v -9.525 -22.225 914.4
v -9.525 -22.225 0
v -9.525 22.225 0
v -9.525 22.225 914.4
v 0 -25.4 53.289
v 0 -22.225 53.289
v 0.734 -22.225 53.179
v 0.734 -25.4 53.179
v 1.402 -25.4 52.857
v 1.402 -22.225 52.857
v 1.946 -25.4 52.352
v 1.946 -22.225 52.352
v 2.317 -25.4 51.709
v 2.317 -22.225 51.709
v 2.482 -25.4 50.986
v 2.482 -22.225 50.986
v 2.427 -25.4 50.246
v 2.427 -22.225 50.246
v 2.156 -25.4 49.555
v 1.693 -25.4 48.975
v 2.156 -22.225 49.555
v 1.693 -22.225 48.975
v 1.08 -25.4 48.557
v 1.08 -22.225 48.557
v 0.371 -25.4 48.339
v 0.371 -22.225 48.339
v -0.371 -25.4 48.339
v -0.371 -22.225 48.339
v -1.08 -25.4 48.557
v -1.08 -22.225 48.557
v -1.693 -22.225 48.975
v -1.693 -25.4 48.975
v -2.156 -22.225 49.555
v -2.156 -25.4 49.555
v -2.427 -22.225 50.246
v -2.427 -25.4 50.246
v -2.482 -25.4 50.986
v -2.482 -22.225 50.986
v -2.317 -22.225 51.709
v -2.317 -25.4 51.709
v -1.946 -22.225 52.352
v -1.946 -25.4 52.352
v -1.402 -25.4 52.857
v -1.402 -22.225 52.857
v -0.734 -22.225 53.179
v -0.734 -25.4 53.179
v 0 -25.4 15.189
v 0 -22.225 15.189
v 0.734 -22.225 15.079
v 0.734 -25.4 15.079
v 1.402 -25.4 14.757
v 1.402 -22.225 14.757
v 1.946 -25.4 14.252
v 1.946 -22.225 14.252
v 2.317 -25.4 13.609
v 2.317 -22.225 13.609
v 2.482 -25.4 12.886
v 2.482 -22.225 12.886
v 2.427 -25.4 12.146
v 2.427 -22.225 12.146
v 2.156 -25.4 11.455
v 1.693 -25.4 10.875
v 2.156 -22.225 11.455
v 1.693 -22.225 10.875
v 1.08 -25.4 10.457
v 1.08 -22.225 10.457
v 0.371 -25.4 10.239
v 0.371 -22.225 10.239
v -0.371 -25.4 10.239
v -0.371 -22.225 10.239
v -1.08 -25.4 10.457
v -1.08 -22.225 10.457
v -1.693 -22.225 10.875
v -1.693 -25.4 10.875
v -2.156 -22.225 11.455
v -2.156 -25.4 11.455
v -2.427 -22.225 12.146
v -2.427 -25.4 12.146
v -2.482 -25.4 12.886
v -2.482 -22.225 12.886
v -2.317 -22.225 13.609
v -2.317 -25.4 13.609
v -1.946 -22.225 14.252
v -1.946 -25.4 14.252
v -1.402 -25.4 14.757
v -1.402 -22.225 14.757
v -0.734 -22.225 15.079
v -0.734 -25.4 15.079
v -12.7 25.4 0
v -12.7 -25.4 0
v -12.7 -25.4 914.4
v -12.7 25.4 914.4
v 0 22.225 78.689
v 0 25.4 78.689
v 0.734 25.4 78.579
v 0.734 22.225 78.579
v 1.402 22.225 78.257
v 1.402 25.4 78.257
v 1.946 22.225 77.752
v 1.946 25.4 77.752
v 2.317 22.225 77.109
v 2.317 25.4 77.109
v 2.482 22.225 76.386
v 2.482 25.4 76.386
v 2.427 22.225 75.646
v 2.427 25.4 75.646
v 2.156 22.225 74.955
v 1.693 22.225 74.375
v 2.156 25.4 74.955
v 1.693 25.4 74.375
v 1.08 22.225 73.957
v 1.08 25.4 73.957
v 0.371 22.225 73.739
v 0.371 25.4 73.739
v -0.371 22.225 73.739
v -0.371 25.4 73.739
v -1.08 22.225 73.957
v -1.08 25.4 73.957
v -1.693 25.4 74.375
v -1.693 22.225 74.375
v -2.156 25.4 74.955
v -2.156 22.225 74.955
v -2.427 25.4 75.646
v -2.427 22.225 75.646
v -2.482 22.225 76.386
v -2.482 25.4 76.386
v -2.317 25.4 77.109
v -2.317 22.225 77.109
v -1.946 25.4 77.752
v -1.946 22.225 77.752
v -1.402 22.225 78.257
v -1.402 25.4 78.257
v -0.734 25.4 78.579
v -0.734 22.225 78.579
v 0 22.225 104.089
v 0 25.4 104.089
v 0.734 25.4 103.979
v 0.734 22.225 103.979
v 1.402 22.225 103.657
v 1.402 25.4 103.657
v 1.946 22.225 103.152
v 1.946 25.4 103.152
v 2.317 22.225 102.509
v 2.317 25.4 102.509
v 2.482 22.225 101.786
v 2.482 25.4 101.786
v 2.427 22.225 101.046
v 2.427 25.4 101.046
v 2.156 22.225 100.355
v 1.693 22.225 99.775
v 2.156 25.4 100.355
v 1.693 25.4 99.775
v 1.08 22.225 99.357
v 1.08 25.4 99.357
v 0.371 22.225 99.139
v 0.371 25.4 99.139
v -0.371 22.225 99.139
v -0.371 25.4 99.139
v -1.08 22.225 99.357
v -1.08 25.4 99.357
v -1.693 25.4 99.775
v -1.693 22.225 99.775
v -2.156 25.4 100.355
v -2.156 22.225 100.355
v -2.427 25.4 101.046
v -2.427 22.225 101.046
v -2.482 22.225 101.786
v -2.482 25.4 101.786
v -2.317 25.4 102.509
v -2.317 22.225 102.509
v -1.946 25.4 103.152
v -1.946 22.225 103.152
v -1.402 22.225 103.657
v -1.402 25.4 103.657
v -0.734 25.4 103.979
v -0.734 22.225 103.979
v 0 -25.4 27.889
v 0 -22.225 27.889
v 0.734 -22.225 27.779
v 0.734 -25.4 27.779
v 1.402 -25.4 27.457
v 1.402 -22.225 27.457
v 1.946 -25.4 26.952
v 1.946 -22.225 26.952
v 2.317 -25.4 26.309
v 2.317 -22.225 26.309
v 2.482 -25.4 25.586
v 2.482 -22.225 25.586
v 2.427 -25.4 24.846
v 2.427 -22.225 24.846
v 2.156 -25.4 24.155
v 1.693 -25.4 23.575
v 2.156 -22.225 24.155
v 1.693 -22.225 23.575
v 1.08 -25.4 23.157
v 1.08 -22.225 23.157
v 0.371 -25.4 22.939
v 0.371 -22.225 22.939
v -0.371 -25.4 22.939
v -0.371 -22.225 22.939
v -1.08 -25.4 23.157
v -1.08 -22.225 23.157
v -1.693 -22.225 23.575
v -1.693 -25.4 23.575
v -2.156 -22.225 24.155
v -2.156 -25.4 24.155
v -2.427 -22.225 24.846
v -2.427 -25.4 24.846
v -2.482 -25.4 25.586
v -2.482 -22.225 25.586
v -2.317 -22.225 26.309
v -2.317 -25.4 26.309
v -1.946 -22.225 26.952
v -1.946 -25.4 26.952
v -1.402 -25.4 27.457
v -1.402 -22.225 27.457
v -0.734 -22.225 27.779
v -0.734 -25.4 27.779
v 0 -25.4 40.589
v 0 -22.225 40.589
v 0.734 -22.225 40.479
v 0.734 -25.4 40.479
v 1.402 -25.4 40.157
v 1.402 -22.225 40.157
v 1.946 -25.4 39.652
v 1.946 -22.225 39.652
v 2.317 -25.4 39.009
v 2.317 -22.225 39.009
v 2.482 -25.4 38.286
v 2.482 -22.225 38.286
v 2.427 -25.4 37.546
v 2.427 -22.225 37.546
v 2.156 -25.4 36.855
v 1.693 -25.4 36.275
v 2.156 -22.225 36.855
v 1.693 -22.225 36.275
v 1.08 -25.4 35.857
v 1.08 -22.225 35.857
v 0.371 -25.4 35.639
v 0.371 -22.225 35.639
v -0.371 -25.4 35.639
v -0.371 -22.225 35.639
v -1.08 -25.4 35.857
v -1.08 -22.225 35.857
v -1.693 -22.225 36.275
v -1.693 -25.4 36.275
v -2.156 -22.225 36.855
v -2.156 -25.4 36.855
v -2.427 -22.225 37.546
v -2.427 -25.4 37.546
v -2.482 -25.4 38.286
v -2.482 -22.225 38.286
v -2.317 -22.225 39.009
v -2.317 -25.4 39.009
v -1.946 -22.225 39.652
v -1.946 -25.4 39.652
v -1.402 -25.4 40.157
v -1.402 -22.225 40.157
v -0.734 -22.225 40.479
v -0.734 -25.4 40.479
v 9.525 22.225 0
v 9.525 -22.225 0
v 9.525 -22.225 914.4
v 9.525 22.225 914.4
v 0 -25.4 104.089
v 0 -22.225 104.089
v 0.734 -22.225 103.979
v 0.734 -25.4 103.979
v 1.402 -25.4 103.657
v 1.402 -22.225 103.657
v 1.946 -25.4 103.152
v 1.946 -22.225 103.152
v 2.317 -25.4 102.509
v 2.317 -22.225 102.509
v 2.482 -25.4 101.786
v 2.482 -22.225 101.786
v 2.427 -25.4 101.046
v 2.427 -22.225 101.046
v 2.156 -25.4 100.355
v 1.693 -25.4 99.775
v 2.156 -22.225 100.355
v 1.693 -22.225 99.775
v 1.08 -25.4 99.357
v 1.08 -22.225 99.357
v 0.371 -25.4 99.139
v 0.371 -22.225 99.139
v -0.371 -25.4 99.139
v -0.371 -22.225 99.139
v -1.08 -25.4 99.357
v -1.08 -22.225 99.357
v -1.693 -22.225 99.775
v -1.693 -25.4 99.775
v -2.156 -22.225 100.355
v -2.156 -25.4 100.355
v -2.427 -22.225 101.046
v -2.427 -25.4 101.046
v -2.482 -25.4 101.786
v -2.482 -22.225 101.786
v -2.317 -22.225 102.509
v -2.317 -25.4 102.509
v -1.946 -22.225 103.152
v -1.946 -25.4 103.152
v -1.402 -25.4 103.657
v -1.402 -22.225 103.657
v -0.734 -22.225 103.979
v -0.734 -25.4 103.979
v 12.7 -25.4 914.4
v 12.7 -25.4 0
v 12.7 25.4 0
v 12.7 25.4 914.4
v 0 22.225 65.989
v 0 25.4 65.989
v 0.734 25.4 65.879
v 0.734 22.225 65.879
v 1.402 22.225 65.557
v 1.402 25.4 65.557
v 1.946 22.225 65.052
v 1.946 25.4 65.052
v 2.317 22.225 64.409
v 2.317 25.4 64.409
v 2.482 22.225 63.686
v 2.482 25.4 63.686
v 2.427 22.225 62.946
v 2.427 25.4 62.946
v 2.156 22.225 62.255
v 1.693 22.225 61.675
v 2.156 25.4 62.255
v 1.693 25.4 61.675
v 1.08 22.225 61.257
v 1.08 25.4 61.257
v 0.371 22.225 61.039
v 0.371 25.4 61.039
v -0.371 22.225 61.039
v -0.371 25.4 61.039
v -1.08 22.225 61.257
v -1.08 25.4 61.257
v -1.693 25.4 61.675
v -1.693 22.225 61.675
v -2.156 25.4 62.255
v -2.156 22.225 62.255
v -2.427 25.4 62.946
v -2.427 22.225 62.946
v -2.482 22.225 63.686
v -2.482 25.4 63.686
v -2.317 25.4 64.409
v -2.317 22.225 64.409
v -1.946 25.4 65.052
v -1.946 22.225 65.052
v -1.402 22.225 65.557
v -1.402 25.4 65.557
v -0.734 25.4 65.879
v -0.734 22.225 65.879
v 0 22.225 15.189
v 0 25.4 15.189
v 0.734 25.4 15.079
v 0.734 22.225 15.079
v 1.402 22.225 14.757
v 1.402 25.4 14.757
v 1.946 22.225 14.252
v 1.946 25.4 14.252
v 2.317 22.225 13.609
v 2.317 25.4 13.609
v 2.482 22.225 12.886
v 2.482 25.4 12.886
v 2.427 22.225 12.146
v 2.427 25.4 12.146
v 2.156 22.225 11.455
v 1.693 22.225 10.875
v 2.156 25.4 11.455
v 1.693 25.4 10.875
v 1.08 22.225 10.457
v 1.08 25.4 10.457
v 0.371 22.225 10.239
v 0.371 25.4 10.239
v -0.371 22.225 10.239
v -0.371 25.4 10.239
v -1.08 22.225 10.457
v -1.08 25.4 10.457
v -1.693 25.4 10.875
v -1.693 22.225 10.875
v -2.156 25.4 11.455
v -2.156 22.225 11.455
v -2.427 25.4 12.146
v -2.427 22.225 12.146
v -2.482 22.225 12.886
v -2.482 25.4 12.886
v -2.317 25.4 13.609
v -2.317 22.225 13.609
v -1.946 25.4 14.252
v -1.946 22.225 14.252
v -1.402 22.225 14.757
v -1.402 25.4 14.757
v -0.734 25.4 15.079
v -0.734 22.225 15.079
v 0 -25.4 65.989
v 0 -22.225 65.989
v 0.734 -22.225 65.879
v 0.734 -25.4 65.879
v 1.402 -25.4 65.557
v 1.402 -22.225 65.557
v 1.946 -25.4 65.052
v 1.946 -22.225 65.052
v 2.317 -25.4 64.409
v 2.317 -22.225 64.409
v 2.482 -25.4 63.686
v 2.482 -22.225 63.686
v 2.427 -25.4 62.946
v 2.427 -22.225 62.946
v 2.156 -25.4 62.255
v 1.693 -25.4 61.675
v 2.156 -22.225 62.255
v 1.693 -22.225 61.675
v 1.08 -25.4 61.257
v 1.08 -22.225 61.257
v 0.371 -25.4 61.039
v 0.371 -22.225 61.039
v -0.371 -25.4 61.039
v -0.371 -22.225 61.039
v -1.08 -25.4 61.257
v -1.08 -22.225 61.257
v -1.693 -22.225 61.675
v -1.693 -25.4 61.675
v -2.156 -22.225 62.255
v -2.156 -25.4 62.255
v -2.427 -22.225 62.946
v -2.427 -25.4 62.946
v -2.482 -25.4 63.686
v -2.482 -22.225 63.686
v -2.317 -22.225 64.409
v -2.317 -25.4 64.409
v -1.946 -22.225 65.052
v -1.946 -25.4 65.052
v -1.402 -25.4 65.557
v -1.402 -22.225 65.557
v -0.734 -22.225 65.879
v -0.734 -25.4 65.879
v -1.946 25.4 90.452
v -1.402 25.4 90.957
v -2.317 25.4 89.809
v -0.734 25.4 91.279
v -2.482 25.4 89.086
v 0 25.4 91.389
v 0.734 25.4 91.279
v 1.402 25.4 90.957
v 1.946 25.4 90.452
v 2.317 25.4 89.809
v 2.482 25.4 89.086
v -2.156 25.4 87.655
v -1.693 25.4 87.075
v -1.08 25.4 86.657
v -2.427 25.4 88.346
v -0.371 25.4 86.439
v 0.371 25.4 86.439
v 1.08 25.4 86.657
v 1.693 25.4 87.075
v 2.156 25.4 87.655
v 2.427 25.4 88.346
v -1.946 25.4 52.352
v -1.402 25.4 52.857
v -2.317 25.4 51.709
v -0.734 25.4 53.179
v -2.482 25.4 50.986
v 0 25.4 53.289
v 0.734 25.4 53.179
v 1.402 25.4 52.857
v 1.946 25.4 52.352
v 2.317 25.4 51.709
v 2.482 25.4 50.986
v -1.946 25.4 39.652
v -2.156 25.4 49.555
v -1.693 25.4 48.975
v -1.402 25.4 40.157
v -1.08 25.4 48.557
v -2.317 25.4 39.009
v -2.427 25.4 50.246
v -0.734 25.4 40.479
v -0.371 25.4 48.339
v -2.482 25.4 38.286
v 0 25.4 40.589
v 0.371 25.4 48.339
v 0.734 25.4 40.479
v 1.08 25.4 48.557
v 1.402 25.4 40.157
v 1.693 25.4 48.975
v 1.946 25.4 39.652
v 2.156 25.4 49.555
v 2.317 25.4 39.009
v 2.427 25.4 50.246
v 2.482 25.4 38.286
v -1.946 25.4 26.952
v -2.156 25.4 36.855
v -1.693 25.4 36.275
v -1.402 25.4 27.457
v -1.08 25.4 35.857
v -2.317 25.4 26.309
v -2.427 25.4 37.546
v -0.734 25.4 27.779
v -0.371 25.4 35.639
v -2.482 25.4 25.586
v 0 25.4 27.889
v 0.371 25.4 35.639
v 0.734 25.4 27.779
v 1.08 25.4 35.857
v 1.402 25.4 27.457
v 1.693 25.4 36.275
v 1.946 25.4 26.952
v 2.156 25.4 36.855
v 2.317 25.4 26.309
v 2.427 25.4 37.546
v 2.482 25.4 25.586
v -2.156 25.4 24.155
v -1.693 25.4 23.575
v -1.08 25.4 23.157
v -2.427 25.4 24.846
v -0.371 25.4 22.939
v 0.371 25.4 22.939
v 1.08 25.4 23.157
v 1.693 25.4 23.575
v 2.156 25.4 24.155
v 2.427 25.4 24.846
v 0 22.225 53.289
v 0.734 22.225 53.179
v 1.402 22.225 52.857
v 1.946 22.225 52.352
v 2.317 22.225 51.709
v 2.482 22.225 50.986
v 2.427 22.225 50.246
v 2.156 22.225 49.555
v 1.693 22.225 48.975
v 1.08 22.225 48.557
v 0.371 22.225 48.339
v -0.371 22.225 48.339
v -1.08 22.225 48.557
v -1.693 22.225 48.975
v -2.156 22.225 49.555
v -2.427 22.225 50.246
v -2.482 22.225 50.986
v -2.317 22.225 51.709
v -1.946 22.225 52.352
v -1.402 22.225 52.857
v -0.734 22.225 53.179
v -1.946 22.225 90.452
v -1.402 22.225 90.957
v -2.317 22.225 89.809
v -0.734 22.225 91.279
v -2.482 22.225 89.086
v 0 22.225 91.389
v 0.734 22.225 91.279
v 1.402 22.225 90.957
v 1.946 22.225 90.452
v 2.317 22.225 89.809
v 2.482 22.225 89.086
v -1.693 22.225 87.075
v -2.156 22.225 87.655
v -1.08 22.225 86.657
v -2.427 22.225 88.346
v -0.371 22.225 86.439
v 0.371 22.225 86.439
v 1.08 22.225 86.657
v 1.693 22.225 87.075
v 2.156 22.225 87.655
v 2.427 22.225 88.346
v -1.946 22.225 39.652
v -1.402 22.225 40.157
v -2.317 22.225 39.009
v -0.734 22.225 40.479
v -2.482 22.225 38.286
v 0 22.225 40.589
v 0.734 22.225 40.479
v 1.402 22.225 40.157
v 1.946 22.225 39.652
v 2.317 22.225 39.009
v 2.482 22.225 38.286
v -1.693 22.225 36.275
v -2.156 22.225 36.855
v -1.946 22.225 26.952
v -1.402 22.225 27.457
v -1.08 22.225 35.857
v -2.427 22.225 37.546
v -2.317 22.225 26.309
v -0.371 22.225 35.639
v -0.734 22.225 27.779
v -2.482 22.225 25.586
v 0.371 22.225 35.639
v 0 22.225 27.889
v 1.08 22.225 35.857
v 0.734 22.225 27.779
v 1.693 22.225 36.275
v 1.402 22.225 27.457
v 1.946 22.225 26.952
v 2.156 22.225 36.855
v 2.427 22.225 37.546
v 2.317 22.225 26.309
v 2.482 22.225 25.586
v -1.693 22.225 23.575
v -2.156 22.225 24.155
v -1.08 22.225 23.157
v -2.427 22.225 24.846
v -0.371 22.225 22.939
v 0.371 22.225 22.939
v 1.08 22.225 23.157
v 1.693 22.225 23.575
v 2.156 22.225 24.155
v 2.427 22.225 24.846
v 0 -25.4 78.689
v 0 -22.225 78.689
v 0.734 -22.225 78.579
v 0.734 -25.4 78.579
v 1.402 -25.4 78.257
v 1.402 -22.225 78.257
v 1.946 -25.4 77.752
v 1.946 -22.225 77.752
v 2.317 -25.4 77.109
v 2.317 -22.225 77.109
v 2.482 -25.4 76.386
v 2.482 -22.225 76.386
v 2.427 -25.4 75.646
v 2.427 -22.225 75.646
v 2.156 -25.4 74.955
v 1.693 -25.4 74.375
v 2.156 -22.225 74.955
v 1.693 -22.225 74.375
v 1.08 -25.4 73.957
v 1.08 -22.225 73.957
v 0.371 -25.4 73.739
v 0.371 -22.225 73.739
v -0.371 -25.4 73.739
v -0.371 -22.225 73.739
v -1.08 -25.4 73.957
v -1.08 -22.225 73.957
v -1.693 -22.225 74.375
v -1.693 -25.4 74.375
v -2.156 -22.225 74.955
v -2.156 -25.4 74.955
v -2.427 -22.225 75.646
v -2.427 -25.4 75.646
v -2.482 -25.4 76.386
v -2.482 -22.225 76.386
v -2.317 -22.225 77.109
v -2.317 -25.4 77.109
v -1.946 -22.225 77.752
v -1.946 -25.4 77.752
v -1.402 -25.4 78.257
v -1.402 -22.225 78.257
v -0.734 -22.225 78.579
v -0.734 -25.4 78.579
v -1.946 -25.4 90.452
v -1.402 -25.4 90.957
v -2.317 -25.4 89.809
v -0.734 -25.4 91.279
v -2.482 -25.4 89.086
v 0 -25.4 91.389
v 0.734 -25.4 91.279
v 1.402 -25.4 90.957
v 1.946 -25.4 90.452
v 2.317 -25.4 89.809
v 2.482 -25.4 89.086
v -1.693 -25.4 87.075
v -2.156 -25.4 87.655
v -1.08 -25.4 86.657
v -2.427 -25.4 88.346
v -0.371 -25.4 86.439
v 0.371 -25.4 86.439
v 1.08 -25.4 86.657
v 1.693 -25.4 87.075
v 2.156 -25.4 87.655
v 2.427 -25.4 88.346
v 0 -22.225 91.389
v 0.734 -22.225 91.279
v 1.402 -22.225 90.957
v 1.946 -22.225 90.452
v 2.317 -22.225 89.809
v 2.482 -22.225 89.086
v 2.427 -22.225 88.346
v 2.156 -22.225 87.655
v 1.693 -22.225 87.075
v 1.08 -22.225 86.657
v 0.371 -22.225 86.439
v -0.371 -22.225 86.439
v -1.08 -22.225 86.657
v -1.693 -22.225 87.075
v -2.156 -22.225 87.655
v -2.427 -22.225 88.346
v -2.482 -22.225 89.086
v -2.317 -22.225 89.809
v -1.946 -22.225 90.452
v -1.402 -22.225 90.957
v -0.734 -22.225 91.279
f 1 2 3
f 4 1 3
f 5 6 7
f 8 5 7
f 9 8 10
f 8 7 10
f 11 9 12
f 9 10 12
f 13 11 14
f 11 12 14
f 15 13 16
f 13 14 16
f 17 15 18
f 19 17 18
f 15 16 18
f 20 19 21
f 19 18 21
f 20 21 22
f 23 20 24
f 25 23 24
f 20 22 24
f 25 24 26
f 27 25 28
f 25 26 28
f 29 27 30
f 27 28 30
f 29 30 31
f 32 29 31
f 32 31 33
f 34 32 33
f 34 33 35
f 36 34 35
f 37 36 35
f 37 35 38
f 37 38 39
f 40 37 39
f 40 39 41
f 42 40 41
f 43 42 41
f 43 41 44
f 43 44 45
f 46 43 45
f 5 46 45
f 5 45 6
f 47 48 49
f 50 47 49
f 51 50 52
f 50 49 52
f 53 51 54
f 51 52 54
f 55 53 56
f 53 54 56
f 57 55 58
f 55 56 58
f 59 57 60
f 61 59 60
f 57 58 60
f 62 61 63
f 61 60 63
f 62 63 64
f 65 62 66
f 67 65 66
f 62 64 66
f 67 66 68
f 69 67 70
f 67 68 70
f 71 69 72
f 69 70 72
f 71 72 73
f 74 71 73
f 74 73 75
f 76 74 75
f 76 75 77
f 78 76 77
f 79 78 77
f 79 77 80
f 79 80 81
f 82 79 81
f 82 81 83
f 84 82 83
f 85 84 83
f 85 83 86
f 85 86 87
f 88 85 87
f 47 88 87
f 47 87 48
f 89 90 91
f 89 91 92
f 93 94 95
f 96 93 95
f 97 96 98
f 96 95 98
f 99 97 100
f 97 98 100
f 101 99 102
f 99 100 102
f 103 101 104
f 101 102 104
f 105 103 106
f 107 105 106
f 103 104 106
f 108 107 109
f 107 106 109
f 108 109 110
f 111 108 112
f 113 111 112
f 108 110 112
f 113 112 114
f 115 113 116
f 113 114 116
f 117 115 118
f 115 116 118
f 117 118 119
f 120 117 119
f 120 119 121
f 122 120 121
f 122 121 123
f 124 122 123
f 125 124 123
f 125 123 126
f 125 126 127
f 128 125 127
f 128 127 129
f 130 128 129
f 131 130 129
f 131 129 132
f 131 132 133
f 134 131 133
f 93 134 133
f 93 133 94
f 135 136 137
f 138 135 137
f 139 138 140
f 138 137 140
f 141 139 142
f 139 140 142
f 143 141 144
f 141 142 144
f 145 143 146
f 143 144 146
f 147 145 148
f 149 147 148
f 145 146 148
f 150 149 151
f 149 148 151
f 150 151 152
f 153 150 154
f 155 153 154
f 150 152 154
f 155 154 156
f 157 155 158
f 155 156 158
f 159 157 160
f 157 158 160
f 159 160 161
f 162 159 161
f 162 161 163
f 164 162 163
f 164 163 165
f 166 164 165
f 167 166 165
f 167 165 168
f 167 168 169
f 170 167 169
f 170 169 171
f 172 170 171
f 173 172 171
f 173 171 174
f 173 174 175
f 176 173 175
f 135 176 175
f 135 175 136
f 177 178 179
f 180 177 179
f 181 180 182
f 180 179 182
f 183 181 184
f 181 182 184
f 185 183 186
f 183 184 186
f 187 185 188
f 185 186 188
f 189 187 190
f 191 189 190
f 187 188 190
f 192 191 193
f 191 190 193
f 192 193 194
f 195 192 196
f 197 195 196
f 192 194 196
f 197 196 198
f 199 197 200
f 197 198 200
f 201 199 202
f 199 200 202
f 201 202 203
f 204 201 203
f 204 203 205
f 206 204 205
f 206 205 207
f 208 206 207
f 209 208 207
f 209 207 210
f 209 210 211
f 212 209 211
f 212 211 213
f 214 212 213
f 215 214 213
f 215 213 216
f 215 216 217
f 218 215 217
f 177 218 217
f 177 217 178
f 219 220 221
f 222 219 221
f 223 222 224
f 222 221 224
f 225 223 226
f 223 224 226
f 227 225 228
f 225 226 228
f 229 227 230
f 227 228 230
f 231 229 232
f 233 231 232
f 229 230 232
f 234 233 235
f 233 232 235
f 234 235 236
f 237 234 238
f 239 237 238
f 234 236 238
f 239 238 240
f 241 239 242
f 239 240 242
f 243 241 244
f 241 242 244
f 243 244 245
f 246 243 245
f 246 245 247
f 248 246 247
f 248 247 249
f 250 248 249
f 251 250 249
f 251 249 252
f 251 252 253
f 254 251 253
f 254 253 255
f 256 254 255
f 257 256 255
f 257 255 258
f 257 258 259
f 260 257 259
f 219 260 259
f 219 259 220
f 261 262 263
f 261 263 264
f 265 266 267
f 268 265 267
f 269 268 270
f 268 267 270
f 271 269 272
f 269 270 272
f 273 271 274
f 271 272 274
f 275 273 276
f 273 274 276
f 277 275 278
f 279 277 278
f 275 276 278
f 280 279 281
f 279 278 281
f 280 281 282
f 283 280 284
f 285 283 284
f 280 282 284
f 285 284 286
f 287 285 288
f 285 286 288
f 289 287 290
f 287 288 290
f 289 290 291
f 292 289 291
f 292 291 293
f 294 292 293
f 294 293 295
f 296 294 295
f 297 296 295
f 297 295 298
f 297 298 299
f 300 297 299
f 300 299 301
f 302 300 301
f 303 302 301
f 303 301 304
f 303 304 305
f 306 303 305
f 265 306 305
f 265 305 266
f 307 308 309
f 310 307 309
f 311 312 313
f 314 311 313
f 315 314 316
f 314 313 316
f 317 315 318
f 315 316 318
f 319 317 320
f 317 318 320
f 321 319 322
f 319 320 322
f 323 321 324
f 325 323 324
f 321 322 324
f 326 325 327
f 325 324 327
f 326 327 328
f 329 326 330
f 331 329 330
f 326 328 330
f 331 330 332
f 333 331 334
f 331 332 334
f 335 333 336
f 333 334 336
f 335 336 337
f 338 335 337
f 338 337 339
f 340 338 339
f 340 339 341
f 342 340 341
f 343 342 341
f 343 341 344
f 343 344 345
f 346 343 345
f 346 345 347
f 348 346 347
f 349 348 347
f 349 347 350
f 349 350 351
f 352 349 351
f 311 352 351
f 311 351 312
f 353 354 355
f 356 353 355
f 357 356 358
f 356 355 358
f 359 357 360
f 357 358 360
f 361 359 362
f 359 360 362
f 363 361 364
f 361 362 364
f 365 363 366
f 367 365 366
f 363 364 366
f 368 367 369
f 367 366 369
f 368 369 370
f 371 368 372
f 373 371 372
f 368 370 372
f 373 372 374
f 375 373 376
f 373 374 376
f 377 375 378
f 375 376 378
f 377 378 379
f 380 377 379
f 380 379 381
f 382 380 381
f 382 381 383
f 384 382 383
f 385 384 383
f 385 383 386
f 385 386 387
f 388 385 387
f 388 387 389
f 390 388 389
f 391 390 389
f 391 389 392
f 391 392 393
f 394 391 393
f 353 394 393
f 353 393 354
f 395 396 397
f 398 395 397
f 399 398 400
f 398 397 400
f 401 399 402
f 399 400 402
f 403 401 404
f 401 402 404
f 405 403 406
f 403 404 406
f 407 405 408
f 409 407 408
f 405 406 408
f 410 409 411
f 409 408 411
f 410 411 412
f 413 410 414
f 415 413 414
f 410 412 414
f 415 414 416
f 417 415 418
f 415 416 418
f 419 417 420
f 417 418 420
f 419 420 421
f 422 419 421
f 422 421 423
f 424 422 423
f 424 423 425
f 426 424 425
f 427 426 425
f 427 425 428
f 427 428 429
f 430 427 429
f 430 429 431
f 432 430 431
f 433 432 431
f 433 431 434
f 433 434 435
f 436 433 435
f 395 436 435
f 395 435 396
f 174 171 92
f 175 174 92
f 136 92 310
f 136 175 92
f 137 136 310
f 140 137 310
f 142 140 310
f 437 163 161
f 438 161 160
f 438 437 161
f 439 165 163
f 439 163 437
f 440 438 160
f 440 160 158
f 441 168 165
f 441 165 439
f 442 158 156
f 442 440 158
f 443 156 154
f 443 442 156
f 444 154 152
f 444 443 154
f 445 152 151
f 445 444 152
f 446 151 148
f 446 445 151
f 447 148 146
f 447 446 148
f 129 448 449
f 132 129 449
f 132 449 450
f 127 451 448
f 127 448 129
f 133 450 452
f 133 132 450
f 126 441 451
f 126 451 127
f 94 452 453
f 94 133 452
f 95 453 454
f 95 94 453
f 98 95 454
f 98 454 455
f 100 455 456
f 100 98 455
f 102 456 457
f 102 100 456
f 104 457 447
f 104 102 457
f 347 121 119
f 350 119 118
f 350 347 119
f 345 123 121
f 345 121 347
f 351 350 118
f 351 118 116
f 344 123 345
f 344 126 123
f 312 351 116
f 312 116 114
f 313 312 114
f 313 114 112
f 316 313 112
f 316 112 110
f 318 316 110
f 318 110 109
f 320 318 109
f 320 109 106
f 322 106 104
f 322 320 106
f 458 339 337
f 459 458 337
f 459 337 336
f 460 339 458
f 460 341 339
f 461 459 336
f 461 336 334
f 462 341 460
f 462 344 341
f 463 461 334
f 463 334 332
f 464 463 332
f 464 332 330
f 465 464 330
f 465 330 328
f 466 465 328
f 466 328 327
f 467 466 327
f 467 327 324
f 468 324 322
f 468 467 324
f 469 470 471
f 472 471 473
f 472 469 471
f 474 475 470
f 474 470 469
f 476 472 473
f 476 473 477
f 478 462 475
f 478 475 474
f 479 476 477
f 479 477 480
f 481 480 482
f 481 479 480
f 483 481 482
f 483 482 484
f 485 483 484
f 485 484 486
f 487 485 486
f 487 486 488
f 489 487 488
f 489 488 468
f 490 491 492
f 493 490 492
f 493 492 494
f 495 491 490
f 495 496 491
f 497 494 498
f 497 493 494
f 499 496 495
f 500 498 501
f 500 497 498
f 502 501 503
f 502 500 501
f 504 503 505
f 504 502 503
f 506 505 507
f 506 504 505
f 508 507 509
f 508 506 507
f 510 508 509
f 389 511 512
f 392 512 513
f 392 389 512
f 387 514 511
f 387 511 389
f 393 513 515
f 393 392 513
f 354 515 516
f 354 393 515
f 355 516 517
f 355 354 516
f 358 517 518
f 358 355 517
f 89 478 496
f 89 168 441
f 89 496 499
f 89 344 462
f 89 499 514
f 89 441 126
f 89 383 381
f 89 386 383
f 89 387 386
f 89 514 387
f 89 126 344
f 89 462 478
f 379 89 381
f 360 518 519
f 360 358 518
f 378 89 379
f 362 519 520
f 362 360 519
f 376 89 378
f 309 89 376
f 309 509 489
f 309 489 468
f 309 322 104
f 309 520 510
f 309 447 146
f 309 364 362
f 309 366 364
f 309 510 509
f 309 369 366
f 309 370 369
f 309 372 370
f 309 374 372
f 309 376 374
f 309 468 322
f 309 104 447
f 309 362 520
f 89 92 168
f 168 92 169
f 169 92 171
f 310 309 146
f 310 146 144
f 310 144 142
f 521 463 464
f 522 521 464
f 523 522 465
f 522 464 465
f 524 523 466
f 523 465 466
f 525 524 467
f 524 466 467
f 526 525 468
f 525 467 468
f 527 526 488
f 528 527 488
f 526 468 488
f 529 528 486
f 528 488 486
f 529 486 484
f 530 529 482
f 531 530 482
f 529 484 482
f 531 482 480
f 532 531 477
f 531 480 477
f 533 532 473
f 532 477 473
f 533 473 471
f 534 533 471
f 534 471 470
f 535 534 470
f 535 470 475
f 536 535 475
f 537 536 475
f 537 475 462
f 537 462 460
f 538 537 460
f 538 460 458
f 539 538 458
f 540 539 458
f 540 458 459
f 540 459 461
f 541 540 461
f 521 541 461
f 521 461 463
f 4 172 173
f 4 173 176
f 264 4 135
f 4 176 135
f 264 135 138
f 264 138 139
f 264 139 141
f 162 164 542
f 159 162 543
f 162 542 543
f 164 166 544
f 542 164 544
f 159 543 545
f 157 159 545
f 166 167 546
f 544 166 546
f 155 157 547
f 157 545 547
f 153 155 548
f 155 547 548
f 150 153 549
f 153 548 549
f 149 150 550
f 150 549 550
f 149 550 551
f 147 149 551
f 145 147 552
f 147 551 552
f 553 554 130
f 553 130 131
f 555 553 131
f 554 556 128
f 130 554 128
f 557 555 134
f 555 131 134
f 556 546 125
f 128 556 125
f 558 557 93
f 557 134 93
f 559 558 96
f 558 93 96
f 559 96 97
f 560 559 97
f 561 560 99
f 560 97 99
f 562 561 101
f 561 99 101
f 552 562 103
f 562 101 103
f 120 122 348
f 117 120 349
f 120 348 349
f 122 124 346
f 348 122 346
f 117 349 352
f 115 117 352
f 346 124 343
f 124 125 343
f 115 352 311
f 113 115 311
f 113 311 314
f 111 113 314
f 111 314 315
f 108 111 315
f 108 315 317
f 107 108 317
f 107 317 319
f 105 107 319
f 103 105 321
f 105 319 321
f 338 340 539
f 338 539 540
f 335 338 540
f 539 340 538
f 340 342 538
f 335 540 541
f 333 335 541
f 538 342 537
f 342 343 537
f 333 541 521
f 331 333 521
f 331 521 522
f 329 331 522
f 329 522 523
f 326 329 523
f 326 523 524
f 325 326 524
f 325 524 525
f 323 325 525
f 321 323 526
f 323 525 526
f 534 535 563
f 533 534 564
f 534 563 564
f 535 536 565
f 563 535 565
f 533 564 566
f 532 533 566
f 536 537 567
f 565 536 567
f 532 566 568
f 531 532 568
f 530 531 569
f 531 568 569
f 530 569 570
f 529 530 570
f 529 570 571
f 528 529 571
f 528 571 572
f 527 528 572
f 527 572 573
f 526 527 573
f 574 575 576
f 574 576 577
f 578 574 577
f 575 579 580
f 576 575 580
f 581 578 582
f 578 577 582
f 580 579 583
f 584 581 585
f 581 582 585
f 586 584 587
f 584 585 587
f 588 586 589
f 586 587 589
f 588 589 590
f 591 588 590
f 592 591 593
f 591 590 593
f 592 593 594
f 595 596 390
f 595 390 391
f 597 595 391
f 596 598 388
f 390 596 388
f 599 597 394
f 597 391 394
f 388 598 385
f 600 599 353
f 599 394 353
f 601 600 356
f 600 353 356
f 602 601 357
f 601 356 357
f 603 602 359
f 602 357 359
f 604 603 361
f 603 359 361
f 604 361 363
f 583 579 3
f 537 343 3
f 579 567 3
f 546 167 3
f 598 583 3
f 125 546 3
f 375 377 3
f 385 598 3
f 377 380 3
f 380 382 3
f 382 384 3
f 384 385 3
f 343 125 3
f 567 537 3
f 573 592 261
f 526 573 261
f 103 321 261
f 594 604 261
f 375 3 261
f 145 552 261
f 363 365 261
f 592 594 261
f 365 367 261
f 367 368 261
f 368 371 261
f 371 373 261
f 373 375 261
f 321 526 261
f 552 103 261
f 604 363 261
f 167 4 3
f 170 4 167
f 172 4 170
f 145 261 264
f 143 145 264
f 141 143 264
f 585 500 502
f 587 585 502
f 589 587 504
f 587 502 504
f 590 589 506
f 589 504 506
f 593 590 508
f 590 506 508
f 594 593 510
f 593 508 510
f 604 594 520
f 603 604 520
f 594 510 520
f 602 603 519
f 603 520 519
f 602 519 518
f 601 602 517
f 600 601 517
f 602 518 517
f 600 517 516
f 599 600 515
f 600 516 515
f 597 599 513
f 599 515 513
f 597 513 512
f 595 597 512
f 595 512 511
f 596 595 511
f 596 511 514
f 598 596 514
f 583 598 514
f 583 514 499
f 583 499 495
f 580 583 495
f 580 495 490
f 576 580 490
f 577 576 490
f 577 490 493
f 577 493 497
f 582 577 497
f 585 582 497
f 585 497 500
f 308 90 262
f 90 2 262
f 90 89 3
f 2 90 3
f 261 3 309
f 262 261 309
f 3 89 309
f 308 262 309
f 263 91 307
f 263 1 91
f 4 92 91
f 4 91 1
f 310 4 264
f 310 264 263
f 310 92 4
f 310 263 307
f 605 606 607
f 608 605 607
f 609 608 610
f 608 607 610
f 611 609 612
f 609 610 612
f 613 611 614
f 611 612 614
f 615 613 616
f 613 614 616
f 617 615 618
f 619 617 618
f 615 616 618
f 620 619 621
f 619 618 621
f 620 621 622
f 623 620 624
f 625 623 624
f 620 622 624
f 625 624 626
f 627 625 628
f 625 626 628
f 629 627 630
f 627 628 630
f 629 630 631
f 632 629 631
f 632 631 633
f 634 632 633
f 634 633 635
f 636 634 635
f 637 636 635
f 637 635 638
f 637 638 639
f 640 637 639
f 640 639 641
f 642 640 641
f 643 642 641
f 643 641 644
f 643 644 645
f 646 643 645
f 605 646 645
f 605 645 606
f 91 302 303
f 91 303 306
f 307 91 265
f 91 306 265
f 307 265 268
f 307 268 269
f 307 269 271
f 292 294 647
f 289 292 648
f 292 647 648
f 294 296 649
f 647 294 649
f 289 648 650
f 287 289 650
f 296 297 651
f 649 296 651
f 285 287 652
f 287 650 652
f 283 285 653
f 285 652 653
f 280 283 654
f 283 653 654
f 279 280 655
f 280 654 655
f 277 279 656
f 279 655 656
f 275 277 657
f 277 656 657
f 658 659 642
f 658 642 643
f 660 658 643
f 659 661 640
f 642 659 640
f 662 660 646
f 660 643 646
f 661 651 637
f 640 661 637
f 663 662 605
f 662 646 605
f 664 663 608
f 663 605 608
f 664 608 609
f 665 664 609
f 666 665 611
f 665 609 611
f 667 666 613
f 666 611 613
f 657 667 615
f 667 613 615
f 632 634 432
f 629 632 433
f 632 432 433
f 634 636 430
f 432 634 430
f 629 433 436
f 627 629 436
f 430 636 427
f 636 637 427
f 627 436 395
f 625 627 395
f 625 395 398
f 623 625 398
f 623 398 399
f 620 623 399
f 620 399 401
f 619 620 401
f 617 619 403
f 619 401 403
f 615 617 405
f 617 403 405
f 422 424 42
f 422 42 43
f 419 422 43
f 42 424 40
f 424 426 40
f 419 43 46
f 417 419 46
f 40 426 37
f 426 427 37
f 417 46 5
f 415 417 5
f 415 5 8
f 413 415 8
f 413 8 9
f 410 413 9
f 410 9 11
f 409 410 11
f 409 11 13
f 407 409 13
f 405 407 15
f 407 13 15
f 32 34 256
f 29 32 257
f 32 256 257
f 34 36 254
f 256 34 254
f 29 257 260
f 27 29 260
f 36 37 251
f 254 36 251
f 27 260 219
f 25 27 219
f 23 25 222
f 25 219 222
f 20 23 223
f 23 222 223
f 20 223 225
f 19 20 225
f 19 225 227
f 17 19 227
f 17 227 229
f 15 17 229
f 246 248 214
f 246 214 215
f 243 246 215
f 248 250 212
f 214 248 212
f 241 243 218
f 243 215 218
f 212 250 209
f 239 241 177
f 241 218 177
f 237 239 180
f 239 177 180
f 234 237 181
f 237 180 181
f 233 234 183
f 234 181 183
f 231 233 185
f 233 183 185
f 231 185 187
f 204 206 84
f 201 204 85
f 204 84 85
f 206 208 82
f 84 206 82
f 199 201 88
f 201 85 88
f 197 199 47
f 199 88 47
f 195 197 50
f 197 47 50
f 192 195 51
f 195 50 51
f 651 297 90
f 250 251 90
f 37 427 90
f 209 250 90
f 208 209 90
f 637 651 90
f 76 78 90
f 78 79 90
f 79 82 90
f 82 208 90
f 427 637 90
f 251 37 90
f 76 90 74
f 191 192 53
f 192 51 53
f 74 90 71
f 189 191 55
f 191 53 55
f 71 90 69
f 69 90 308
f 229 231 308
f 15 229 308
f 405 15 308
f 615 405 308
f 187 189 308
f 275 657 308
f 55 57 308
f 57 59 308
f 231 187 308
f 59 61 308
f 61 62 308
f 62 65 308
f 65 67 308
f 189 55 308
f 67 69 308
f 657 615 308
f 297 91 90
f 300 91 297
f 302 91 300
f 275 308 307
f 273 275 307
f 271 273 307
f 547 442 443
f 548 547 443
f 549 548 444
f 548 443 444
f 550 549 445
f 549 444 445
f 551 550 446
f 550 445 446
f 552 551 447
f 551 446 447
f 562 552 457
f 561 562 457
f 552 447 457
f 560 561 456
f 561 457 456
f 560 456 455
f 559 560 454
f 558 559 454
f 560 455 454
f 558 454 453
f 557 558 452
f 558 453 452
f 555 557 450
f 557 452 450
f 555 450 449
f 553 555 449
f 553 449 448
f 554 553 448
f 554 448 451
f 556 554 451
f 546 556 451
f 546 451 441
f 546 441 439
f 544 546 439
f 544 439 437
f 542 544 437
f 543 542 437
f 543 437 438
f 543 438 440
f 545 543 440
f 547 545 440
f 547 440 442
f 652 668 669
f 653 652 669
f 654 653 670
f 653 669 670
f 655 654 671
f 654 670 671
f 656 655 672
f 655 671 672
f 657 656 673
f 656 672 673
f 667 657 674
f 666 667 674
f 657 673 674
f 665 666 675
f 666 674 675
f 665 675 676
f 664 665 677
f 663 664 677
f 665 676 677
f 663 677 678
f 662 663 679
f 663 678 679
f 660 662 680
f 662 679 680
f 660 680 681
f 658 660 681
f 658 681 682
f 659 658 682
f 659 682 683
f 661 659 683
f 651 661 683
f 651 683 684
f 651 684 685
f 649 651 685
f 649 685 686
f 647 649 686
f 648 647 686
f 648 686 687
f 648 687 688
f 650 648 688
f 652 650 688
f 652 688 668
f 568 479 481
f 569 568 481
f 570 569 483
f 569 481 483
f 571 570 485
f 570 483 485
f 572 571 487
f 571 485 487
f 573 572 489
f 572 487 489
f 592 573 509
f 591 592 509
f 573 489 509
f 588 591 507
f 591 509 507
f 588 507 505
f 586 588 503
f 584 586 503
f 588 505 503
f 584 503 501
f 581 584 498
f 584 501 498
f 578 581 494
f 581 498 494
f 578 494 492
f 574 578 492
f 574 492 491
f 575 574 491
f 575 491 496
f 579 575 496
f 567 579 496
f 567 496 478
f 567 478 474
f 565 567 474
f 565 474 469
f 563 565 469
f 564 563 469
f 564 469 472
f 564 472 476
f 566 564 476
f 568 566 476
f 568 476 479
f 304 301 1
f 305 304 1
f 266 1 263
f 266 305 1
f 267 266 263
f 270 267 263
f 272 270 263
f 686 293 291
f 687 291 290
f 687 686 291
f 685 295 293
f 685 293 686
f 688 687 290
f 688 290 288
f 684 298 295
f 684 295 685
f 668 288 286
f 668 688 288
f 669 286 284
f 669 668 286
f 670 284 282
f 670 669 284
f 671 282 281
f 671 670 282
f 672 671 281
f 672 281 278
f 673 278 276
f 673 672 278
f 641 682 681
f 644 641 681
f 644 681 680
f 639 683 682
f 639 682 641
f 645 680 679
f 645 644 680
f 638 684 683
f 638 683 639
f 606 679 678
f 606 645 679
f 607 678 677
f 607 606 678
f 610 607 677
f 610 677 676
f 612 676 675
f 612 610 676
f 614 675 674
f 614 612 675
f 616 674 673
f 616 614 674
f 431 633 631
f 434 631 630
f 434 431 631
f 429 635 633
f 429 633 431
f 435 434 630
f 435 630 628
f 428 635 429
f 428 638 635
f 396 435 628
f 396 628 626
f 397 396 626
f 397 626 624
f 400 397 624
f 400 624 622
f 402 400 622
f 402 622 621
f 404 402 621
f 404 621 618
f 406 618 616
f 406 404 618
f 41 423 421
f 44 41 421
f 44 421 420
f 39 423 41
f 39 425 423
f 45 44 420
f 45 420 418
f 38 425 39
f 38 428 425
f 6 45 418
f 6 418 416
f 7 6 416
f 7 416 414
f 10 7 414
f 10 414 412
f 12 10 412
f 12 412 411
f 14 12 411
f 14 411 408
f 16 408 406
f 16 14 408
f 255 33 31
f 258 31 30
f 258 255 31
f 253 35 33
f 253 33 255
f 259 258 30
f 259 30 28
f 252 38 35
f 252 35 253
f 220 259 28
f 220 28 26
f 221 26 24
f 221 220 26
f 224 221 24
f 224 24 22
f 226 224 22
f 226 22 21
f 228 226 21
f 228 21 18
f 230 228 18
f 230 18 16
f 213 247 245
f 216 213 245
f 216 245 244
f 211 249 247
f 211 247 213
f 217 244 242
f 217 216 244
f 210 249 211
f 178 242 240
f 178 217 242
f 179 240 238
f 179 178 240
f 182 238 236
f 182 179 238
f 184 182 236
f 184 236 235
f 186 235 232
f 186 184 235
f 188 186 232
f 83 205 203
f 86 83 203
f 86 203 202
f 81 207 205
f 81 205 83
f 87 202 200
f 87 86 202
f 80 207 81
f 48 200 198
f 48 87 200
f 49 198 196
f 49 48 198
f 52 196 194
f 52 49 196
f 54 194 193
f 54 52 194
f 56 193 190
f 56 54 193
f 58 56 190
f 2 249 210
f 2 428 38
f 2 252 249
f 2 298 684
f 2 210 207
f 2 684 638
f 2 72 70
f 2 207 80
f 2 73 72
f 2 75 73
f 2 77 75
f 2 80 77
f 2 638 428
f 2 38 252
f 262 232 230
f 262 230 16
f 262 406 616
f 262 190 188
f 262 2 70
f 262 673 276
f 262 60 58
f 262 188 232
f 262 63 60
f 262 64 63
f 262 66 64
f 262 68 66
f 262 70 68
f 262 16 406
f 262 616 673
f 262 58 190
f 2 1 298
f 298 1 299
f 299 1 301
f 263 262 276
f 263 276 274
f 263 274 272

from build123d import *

# Parameters (mm, degrees)
SKETCH1_W           = 25.4
SKETCH1_H           = 50.8
SKETCH1_W_2         = 19.05
SKETCH1_H_2         = 44.45
BOSS_EXTRUDE1_DEPTH = 914.4
SKETCH2_R           = 2.4892
CUT_EXTRUDE1_DEPTH  = 916.898078391


with BuildPart() as part:
    # Sketch1 → Boss-Extrude1 (new body)
    with BuildSketch(Plane.XY):
        Rectangle(SKETCH1_W, SKETCH1_H)
        Rectangle(SKETCH1_W_2, SKETCH1_H_2, mode=Mode.SUBTRACT)
    extrude(amount=BOSS_EXTRUDE1_DEPTH)

    # Sketch2 → Cut-Extrude1 (cut, through all)
    with BuildSketch(Plane(origin=(0, 25.4, 0), x_dir=(1, 0, 0), z_dir=(0, 1, 0))):
        with Locations(Location((0, -12.7, 0), (0, 0, 270))):
            Circle(SKETCH2_R)
        with Locations(Location((0, -25.4, 0), (0, 0, 270))):
            Circle(SKETCH2_R)
        with Locations(Location((0, -38.1, 0), (0, 0, 270))):
            Circle(SKETCH2_R)
        with Locations(Location((0, -50.8, 0), (0, 0, 270))):
            Circle(SKETCH2_R)
        with Locations(Location((0, -63.5, 0), (0, 0, 270))):
            Circle(SKETCH2_R)
        with Locations(Location((0, -76.2, 0), (0, 0, 270))):
            Circle(SKETCH2_R)
        with Locations(Location((0, -88.9, 0), (0, 0, 270))):
            Circle(SKETCH2_R)
        with Locations(Location((0, -101.6, 0), (0, 0, 270))):
            Circle(SKETCH2_R)
    extrude(amount=-CUT_EXTRUDE1_DEPTH, mode=Mode.SUBTRACT)


solid = part.part
